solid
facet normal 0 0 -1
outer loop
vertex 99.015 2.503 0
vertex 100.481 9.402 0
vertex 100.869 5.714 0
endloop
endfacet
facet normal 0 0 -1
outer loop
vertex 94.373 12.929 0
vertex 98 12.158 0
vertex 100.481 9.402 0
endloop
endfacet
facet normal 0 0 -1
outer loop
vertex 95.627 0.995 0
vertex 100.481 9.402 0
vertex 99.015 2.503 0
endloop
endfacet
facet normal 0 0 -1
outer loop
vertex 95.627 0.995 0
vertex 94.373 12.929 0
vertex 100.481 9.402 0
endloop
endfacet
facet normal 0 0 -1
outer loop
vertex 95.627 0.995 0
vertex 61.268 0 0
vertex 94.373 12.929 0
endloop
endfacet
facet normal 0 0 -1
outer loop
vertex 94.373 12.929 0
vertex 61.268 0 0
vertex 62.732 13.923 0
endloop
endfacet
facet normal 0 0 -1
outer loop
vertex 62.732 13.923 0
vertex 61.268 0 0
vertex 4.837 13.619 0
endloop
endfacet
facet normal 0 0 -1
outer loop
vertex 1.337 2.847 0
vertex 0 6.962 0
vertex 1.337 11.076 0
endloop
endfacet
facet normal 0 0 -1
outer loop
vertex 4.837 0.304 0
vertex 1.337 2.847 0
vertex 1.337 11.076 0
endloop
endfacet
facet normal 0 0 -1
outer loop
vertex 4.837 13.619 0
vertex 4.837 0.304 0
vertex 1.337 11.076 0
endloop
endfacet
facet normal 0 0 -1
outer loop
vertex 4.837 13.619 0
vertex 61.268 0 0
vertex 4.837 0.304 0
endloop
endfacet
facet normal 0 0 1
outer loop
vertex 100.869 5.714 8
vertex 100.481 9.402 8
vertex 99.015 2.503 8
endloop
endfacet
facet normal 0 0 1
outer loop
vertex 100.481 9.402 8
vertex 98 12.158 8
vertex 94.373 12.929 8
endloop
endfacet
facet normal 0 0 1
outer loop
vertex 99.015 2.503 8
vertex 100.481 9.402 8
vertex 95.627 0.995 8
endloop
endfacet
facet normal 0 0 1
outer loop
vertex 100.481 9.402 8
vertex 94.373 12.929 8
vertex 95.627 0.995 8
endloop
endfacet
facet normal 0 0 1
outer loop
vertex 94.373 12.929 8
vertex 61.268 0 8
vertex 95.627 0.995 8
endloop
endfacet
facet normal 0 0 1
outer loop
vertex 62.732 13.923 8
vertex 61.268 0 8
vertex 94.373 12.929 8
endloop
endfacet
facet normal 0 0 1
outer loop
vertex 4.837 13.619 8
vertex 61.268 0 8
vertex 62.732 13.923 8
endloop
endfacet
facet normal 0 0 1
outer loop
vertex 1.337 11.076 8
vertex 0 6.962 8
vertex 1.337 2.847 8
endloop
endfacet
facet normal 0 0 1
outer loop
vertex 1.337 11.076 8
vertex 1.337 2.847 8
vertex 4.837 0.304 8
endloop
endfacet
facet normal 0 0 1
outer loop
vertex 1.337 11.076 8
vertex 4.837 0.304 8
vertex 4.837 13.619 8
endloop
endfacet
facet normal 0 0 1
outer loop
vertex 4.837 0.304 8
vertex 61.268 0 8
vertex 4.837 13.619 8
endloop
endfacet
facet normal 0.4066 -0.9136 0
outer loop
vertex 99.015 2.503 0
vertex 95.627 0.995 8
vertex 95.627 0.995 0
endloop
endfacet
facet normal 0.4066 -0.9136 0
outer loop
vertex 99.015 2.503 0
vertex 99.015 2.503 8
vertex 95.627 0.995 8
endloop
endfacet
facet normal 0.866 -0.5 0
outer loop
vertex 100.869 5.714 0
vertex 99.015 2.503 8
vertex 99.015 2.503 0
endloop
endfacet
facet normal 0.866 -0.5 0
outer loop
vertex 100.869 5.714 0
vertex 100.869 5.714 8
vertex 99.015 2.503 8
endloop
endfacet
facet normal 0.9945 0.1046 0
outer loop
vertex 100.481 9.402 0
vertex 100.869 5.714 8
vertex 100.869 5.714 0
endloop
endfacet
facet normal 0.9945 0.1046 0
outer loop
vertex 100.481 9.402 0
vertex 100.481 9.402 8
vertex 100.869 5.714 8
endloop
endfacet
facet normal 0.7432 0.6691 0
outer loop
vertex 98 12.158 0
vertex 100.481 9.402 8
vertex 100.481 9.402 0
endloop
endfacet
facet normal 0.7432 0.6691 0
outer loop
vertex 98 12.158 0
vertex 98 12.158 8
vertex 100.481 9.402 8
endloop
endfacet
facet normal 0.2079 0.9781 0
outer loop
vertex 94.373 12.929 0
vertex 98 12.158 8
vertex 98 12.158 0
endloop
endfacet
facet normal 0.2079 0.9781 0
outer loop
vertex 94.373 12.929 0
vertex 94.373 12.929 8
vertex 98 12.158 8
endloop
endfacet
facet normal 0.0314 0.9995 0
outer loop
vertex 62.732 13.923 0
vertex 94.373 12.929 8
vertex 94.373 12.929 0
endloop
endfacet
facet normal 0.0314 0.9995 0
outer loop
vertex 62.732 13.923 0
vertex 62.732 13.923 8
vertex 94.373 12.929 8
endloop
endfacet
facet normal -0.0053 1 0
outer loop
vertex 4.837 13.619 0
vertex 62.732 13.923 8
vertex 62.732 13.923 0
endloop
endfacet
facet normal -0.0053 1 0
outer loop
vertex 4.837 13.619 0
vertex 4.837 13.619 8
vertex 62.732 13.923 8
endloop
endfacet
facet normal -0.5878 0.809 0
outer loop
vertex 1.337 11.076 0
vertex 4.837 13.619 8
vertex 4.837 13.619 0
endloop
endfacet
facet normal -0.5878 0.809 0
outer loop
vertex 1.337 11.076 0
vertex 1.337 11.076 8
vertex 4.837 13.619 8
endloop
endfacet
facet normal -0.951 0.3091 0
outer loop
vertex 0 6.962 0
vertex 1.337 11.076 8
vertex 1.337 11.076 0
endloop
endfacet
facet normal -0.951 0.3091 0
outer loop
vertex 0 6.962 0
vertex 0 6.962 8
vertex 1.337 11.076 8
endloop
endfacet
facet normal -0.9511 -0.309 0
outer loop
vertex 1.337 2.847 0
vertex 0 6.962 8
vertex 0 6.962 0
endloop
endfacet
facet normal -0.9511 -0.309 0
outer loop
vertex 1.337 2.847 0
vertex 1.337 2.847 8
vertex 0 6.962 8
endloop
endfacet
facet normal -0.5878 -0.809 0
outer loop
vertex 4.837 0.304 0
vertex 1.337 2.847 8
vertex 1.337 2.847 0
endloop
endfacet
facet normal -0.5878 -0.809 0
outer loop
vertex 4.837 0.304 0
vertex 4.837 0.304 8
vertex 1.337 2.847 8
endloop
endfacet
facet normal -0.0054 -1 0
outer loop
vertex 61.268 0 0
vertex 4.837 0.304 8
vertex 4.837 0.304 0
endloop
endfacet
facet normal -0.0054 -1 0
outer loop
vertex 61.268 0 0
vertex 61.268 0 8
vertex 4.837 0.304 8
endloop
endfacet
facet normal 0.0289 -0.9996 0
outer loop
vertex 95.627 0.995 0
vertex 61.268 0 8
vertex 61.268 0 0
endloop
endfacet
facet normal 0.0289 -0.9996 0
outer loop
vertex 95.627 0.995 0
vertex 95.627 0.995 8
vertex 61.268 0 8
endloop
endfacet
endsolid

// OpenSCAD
$fn = 32;

// ----------------------------------------------------------------------
// Lever arm: two bosses 14 and 14 mm, 55 mm between centres
// ----------------------------------------------------------------------

// --- parameters (mm) ---
profile_height = 8;       // extrusion height
profile_points = 13;      // points of the closed outline

profile = [[0, 6.962], [1.337, 2.847], [4.837, 0.304], [61.268, 0], [95.627, 0.995], [99.015, 2.503], [100.869, 5.714], [100.481, 9.402], [98, 12.158], [94.373, 12.929], [62.732, 13.923], [4.837, 13.619], [1.337, 11.076]];  // single closed polygon, 13 points, counter clockwise

// --- the one profile operation ---
linear_extrude(height = profile_height) polygon(points = profile);
